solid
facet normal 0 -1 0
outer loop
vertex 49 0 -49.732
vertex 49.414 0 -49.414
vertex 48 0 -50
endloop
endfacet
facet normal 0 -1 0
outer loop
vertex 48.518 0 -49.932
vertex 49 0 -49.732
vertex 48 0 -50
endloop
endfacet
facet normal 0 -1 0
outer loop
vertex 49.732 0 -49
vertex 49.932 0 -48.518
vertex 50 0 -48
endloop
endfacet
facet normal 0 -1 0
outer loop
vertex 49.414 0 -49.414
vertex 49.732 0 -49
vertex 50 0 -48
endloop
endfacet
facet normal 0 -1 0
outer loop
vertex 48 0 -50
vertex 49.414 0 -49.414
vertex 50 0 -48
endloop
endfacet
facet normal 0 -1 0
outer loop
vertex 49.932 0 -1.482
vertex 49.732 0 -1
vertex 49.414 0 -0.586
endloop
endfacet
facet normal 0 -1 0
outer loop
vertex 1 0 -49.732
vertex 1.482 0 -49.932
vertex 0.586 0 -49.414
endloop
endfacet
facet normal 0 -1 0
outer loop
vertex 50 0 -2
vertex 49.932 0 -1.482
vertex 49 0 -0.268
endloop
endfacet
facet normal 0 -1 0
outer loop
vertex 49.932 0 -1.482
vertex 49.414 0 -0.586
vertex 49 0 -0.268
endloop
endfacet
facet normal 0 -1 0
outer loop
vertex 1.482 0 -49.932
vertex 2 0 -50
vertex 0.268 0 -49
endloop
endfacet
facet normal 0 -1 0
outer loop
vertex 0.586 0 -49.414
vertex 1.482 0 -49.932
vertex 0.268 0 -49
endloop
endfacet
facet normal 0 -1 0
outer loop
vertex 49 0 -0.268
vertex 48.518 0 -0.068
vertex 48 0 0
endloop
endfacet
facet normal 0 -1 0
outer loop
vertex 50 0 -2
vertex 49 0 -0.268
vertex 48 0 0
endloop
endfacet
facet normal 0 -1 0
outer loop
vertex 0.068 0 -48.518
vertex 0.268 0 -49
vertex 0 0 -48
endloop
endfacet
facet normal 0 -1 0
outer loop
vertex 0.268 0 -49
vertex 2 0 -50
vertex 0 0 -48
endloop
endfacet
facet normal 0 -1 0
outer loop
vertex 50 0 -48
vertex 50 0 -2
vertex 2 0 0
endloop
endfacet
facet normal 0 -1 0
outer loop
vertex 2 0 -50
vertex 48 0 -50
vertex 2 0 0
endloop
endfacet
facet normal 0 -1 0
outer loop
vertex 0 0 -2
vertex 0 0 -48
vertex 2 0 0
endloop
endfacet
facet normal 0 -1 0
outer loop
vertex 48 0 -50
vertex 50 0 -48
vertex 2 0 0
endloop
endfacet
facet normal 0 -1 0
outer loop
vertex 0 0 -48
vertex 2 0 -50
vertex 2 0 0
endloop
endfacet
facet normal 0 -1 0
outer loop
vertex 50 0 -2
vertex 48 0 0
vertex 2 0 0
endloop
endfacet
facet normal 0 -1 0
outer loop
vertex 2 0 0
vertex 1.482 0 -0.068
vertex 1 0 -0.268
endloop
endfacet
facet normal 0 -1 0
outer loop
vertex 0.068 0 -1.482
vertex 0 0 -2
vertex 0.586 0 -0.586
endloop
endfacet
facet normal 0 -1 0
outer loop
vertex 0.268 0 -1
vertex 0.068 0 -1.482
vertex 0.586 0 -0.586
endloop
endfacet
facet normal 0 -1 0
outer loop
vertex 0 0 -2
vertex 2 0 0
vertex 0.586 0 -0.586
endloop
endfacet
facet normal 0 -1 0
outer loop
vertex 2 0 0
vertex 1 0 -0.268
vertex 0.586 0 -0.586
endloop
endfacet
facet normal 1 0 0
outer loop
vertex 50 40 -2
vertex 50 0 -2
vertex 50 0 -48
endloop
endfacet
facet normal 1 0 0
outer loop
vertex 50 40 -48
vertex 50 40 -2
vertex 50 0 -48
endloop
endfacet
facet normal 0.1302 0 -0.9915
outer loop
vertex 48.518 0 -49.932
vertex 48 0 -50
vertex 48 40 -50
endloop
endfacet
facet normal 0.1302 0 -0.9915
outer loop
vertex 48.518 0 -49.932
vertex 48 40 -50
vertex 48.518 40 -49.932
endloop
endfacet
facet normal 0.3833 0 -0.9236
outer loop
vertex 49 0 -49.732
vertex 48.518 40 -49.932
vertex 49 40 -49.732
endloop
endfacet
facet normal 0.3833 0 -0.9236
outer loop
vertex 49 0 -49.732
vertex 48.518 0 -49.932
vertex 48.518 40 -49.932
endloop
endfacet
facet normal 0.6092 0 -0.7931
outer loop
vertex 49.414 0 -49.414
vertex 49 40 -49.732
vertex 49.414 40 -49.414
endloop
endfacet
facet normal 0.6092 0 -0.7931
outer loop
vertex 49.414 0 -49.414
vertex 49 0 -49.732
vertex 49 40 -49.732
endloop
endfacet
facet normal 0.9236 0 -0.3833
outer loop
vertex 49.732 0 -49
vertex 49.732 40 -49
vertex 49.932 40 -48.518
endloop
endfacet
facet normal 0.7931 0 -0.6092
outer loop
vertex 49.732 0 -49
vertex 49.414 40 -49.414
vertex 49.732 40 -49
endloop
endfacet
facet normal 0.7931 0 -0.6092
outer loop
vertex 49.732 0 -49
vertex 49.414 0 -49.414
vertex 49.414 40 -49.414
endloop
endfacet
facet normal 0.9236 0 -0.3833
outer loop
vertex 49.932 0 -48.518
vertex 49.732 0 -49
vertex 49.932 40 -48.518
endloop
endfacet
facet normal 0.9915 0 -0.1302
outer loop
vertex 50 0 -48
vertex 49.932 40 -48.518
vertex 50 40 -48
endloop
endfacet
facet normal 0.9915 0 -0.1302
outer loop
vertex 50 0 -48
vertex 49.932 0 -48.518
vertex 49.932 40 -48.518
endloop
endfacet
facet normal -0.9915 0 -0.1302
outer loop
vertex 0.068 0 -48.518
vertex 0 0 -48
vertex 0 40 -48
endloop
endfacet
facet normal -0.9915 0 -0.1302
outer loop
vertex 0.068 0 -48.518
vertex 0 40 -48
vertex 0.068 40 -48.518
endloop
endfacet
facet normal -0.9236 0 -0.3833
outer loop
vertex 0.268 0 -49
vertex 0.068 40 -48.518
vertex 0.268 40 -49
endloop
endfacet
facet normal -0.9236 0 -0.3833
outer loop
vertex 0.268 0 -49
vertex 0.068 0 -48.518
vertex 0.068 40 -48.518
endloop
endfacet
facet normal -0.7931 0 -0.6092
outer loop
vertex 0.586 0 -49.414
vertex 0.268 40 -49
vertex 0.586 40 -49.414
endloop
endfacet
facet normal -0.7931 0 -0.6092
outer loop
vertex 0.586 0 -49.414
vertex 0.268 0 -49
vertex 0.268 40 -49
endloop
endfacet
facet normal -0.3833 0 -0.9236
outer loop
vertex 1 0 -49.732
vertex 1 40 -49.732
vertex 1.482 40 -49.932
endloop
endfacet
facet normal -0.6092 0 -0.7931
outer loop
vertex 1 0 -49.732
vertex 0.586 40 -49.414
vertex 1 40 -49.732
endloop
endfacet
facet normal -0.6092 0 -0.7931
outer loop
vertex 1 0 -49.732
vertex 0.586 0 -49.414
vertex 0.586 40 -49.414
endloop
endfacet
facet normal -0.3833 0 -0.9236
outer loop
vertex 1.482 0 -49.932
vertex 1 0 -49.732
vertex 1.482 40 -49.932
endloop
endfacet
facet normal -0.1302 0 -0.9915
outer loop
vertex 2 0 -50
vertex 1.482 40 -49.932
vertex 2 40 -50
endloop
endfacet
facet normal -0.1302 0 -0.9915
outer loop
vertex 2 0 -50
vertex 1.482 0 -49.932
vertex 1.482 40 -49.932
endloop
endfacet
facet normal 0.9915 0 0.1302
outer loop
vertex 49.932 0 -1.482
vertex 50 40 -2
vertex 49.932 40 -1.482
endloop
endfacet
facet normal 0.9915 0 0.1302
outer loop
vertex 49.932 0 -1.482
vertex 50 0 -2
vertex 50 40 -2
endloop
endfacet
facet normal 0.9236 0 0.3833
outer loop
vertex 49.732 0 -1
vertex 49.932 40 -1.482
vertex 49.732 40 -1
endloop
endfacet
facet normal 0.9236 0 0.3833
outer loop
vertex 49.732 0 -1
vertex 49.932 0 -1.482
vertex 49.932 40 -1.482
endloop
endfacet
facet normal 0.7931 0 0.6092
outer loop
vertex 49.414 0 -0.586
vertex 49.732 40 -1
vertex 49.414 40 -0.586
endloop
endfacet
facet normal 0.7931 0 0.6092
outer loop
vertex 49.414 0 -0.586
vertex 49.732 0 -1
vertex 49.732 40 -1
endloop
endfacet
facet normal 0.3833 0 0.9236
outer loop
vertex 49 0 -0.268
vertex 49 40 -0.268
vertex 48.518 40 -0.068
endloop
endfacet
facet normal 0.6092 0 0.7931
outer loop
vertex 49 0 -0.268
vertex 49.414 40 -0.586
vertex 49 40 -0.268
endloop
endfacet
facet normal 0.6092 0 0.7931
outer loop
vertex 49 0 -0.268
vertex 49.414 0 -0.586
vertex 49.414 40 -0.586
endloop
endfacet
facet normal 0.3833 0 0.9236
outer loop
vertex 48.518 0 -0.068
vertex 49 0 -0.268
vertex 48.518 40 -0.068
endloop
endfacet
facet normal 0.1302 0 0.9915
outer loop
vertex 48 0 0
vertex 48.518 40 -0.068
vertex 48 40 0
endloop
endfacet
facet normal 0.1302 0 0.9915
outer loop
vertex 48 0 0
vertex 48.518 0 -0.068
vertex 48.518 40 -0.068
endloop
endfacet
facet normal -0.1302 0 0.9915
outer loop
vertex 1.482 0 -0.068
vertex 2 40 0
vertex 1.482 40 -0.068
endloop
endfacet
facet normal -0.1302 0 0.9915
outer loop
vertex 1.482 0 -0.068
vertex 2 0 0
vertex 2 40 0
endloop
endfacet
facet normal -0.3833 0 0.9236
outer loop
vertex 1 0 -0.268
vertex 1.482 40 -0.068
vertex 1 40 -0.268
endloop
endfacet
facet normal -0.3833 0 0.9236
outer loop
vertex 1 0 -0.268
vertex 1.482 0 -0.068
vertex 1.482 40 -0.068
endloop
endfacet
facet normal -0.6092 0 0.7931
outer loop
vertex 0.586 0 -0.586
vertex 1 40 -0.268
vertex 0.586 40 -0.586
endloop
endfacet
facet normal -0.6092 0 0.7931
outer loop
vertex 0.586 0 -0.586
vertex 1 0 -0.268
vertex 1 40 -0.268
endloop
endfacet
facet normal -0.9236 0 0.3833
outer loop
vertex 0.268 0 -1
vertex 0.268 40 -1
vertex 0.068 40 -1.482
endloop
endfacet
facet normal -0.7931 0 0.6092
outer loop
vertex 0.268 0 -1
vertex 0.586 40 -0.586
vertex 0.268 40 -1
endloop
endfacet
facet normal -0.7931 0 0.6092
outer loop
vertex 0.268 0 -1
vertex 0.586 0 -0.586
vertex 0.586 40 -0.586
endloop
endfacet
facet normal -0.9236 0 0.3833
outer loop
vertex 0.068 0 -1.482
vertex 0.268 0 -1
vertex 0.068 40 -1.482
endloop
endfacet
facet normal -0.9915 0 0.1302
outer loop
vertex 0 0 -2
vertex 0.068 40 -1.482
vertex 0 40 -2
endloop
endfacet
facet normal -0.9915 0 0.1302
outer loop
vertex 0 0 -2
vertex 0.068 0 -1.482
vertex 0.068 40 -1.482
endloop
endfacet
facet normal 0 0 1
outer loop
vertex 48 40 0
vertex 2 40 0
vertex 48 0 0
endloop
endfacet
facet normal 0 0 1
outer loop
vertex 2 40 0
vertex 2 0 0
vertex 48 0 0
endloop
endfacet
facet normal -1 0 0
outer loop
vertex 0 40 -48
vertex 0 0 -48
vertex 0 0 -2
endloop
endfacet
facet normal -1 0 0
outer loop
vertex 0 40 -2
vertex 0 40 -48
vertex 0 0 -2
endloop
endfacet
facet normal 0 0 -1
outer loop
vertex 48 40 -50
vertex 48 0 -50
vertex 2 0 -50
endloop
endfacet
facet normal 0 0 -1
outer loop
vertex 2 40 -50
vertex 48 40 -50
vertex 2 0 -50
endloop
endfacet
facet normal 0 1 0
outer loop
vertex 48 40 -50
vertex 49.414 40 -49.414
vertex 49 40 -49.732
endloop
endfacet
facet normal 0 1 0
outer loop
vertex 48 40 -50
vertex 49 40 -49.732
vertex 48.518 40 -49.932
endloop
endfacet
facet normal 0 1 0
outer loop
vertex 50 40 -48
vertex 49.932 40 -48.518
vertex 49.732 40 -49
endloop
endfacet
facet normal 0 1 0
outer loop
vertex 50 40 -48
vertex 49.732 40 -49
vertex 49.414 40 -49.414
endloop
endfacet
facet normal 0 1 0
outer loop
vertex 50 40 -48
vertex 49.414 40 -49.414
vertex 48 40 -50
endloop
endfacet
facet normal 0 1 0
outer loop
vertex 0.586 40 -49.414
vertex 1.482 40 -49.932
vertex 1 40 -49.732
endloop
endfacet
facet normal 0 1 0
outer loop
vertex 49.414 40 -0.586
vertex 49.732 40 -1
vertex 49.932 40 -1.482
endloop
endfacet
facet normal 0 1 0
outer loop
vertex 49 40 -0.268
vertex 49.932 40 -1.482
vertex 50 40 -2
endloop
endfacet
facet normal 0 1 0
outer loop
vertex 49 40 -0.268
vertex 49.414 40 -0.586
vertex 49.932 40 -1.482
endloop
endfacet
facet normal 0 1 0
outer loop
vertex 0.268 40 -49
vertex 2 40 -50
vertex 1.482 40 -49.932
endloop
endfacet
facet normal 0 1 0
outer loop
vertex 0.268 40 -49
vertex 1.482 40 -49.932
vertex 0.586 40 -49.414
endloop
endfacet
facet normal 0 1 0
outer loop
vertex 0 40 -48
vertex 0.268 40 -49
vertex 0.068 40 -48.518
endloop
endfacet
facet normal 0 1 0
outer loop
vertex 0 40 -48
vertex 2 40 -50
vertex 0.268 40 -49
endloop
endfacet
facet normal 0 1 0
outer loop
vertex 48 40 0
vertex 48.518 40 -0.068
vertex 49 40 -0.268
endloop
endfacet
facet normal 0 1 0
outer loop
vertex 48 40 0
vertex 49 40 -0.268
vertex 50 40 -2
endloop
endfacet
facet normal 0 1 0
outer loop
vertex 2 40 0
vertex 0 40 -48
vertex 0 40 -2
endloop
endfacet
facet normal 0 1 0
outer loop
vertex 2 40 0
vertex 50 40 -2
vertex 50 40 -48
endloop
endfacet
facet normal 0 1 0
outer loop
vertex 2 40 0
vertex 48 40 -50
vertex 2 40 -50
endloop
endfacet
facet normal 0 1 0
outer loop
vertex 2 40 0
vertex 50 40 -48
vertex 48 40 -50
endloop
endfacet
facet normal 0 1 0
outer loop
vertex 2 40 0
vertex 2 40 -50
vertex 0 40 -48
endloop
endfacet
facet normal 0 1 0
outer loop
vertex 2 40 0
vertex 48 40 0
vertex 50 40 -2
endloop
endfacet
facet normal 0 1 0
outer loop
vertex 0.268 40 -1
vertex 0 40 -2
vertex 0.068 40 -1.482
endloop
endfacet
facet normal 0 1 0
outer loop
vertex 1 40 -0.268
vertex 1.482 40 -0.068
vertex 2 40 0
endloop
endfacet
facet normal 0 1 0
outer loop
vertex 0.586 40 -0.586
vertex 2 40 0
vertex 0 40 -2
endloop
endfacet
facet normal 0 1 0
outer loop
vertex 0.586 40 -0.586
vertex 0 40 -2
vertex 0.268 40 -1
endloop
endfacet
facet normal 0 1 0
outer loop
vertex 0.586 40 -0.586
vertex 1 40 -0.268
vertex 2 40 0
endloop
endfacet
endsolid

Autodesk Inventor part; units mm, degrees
ref_plane "YZ Plane" through (0, 0, 0) normal (1, 0, 0) x (0, 1, 0)
ref_plane "XZ Plane" through (0, 0, 0) normal (0, 1, 0) x (-1, 0, 0)
ref_plane "XY Plane" through (0, 0, 0) normal (0, 0, 1) x (1, 0, 0)
sketch "Sketch1" plane through (0, 0, 0) normal (0, 1, 0) x (-1, 0, 0)
  line L0 (-2, 0) -> (-48, 0)
  line L1 (-50, -2) -> (-50, -48)
  line L2 (-48, -50) -> (-2, -50)
  line L3 (0, -48) -> (0, -2)
  arc A0 (0, -2) -> (-2, 0) centre (-2, -2) ccw
  arc A1 (-50, -48) -> (-48, -50) centre (-48, -48) ccw
  arc A2 (-2, -50) -> (0, -48) centre (-2, -48) ccw
  arc A3 (-48, 0) -> (-50, -2) centre (-48, -2) ccw
  point P0 (0, 0)
  point P1 (-50, 0)
  point P2 (-50, -50)
  dimension "d0" = 50
  dimension "d1" = 50
  dimension "d2" = 2
extrude "Extrusion1" add sketch "Sketch1" along normal blind 40
properties part number "stepper driver"
